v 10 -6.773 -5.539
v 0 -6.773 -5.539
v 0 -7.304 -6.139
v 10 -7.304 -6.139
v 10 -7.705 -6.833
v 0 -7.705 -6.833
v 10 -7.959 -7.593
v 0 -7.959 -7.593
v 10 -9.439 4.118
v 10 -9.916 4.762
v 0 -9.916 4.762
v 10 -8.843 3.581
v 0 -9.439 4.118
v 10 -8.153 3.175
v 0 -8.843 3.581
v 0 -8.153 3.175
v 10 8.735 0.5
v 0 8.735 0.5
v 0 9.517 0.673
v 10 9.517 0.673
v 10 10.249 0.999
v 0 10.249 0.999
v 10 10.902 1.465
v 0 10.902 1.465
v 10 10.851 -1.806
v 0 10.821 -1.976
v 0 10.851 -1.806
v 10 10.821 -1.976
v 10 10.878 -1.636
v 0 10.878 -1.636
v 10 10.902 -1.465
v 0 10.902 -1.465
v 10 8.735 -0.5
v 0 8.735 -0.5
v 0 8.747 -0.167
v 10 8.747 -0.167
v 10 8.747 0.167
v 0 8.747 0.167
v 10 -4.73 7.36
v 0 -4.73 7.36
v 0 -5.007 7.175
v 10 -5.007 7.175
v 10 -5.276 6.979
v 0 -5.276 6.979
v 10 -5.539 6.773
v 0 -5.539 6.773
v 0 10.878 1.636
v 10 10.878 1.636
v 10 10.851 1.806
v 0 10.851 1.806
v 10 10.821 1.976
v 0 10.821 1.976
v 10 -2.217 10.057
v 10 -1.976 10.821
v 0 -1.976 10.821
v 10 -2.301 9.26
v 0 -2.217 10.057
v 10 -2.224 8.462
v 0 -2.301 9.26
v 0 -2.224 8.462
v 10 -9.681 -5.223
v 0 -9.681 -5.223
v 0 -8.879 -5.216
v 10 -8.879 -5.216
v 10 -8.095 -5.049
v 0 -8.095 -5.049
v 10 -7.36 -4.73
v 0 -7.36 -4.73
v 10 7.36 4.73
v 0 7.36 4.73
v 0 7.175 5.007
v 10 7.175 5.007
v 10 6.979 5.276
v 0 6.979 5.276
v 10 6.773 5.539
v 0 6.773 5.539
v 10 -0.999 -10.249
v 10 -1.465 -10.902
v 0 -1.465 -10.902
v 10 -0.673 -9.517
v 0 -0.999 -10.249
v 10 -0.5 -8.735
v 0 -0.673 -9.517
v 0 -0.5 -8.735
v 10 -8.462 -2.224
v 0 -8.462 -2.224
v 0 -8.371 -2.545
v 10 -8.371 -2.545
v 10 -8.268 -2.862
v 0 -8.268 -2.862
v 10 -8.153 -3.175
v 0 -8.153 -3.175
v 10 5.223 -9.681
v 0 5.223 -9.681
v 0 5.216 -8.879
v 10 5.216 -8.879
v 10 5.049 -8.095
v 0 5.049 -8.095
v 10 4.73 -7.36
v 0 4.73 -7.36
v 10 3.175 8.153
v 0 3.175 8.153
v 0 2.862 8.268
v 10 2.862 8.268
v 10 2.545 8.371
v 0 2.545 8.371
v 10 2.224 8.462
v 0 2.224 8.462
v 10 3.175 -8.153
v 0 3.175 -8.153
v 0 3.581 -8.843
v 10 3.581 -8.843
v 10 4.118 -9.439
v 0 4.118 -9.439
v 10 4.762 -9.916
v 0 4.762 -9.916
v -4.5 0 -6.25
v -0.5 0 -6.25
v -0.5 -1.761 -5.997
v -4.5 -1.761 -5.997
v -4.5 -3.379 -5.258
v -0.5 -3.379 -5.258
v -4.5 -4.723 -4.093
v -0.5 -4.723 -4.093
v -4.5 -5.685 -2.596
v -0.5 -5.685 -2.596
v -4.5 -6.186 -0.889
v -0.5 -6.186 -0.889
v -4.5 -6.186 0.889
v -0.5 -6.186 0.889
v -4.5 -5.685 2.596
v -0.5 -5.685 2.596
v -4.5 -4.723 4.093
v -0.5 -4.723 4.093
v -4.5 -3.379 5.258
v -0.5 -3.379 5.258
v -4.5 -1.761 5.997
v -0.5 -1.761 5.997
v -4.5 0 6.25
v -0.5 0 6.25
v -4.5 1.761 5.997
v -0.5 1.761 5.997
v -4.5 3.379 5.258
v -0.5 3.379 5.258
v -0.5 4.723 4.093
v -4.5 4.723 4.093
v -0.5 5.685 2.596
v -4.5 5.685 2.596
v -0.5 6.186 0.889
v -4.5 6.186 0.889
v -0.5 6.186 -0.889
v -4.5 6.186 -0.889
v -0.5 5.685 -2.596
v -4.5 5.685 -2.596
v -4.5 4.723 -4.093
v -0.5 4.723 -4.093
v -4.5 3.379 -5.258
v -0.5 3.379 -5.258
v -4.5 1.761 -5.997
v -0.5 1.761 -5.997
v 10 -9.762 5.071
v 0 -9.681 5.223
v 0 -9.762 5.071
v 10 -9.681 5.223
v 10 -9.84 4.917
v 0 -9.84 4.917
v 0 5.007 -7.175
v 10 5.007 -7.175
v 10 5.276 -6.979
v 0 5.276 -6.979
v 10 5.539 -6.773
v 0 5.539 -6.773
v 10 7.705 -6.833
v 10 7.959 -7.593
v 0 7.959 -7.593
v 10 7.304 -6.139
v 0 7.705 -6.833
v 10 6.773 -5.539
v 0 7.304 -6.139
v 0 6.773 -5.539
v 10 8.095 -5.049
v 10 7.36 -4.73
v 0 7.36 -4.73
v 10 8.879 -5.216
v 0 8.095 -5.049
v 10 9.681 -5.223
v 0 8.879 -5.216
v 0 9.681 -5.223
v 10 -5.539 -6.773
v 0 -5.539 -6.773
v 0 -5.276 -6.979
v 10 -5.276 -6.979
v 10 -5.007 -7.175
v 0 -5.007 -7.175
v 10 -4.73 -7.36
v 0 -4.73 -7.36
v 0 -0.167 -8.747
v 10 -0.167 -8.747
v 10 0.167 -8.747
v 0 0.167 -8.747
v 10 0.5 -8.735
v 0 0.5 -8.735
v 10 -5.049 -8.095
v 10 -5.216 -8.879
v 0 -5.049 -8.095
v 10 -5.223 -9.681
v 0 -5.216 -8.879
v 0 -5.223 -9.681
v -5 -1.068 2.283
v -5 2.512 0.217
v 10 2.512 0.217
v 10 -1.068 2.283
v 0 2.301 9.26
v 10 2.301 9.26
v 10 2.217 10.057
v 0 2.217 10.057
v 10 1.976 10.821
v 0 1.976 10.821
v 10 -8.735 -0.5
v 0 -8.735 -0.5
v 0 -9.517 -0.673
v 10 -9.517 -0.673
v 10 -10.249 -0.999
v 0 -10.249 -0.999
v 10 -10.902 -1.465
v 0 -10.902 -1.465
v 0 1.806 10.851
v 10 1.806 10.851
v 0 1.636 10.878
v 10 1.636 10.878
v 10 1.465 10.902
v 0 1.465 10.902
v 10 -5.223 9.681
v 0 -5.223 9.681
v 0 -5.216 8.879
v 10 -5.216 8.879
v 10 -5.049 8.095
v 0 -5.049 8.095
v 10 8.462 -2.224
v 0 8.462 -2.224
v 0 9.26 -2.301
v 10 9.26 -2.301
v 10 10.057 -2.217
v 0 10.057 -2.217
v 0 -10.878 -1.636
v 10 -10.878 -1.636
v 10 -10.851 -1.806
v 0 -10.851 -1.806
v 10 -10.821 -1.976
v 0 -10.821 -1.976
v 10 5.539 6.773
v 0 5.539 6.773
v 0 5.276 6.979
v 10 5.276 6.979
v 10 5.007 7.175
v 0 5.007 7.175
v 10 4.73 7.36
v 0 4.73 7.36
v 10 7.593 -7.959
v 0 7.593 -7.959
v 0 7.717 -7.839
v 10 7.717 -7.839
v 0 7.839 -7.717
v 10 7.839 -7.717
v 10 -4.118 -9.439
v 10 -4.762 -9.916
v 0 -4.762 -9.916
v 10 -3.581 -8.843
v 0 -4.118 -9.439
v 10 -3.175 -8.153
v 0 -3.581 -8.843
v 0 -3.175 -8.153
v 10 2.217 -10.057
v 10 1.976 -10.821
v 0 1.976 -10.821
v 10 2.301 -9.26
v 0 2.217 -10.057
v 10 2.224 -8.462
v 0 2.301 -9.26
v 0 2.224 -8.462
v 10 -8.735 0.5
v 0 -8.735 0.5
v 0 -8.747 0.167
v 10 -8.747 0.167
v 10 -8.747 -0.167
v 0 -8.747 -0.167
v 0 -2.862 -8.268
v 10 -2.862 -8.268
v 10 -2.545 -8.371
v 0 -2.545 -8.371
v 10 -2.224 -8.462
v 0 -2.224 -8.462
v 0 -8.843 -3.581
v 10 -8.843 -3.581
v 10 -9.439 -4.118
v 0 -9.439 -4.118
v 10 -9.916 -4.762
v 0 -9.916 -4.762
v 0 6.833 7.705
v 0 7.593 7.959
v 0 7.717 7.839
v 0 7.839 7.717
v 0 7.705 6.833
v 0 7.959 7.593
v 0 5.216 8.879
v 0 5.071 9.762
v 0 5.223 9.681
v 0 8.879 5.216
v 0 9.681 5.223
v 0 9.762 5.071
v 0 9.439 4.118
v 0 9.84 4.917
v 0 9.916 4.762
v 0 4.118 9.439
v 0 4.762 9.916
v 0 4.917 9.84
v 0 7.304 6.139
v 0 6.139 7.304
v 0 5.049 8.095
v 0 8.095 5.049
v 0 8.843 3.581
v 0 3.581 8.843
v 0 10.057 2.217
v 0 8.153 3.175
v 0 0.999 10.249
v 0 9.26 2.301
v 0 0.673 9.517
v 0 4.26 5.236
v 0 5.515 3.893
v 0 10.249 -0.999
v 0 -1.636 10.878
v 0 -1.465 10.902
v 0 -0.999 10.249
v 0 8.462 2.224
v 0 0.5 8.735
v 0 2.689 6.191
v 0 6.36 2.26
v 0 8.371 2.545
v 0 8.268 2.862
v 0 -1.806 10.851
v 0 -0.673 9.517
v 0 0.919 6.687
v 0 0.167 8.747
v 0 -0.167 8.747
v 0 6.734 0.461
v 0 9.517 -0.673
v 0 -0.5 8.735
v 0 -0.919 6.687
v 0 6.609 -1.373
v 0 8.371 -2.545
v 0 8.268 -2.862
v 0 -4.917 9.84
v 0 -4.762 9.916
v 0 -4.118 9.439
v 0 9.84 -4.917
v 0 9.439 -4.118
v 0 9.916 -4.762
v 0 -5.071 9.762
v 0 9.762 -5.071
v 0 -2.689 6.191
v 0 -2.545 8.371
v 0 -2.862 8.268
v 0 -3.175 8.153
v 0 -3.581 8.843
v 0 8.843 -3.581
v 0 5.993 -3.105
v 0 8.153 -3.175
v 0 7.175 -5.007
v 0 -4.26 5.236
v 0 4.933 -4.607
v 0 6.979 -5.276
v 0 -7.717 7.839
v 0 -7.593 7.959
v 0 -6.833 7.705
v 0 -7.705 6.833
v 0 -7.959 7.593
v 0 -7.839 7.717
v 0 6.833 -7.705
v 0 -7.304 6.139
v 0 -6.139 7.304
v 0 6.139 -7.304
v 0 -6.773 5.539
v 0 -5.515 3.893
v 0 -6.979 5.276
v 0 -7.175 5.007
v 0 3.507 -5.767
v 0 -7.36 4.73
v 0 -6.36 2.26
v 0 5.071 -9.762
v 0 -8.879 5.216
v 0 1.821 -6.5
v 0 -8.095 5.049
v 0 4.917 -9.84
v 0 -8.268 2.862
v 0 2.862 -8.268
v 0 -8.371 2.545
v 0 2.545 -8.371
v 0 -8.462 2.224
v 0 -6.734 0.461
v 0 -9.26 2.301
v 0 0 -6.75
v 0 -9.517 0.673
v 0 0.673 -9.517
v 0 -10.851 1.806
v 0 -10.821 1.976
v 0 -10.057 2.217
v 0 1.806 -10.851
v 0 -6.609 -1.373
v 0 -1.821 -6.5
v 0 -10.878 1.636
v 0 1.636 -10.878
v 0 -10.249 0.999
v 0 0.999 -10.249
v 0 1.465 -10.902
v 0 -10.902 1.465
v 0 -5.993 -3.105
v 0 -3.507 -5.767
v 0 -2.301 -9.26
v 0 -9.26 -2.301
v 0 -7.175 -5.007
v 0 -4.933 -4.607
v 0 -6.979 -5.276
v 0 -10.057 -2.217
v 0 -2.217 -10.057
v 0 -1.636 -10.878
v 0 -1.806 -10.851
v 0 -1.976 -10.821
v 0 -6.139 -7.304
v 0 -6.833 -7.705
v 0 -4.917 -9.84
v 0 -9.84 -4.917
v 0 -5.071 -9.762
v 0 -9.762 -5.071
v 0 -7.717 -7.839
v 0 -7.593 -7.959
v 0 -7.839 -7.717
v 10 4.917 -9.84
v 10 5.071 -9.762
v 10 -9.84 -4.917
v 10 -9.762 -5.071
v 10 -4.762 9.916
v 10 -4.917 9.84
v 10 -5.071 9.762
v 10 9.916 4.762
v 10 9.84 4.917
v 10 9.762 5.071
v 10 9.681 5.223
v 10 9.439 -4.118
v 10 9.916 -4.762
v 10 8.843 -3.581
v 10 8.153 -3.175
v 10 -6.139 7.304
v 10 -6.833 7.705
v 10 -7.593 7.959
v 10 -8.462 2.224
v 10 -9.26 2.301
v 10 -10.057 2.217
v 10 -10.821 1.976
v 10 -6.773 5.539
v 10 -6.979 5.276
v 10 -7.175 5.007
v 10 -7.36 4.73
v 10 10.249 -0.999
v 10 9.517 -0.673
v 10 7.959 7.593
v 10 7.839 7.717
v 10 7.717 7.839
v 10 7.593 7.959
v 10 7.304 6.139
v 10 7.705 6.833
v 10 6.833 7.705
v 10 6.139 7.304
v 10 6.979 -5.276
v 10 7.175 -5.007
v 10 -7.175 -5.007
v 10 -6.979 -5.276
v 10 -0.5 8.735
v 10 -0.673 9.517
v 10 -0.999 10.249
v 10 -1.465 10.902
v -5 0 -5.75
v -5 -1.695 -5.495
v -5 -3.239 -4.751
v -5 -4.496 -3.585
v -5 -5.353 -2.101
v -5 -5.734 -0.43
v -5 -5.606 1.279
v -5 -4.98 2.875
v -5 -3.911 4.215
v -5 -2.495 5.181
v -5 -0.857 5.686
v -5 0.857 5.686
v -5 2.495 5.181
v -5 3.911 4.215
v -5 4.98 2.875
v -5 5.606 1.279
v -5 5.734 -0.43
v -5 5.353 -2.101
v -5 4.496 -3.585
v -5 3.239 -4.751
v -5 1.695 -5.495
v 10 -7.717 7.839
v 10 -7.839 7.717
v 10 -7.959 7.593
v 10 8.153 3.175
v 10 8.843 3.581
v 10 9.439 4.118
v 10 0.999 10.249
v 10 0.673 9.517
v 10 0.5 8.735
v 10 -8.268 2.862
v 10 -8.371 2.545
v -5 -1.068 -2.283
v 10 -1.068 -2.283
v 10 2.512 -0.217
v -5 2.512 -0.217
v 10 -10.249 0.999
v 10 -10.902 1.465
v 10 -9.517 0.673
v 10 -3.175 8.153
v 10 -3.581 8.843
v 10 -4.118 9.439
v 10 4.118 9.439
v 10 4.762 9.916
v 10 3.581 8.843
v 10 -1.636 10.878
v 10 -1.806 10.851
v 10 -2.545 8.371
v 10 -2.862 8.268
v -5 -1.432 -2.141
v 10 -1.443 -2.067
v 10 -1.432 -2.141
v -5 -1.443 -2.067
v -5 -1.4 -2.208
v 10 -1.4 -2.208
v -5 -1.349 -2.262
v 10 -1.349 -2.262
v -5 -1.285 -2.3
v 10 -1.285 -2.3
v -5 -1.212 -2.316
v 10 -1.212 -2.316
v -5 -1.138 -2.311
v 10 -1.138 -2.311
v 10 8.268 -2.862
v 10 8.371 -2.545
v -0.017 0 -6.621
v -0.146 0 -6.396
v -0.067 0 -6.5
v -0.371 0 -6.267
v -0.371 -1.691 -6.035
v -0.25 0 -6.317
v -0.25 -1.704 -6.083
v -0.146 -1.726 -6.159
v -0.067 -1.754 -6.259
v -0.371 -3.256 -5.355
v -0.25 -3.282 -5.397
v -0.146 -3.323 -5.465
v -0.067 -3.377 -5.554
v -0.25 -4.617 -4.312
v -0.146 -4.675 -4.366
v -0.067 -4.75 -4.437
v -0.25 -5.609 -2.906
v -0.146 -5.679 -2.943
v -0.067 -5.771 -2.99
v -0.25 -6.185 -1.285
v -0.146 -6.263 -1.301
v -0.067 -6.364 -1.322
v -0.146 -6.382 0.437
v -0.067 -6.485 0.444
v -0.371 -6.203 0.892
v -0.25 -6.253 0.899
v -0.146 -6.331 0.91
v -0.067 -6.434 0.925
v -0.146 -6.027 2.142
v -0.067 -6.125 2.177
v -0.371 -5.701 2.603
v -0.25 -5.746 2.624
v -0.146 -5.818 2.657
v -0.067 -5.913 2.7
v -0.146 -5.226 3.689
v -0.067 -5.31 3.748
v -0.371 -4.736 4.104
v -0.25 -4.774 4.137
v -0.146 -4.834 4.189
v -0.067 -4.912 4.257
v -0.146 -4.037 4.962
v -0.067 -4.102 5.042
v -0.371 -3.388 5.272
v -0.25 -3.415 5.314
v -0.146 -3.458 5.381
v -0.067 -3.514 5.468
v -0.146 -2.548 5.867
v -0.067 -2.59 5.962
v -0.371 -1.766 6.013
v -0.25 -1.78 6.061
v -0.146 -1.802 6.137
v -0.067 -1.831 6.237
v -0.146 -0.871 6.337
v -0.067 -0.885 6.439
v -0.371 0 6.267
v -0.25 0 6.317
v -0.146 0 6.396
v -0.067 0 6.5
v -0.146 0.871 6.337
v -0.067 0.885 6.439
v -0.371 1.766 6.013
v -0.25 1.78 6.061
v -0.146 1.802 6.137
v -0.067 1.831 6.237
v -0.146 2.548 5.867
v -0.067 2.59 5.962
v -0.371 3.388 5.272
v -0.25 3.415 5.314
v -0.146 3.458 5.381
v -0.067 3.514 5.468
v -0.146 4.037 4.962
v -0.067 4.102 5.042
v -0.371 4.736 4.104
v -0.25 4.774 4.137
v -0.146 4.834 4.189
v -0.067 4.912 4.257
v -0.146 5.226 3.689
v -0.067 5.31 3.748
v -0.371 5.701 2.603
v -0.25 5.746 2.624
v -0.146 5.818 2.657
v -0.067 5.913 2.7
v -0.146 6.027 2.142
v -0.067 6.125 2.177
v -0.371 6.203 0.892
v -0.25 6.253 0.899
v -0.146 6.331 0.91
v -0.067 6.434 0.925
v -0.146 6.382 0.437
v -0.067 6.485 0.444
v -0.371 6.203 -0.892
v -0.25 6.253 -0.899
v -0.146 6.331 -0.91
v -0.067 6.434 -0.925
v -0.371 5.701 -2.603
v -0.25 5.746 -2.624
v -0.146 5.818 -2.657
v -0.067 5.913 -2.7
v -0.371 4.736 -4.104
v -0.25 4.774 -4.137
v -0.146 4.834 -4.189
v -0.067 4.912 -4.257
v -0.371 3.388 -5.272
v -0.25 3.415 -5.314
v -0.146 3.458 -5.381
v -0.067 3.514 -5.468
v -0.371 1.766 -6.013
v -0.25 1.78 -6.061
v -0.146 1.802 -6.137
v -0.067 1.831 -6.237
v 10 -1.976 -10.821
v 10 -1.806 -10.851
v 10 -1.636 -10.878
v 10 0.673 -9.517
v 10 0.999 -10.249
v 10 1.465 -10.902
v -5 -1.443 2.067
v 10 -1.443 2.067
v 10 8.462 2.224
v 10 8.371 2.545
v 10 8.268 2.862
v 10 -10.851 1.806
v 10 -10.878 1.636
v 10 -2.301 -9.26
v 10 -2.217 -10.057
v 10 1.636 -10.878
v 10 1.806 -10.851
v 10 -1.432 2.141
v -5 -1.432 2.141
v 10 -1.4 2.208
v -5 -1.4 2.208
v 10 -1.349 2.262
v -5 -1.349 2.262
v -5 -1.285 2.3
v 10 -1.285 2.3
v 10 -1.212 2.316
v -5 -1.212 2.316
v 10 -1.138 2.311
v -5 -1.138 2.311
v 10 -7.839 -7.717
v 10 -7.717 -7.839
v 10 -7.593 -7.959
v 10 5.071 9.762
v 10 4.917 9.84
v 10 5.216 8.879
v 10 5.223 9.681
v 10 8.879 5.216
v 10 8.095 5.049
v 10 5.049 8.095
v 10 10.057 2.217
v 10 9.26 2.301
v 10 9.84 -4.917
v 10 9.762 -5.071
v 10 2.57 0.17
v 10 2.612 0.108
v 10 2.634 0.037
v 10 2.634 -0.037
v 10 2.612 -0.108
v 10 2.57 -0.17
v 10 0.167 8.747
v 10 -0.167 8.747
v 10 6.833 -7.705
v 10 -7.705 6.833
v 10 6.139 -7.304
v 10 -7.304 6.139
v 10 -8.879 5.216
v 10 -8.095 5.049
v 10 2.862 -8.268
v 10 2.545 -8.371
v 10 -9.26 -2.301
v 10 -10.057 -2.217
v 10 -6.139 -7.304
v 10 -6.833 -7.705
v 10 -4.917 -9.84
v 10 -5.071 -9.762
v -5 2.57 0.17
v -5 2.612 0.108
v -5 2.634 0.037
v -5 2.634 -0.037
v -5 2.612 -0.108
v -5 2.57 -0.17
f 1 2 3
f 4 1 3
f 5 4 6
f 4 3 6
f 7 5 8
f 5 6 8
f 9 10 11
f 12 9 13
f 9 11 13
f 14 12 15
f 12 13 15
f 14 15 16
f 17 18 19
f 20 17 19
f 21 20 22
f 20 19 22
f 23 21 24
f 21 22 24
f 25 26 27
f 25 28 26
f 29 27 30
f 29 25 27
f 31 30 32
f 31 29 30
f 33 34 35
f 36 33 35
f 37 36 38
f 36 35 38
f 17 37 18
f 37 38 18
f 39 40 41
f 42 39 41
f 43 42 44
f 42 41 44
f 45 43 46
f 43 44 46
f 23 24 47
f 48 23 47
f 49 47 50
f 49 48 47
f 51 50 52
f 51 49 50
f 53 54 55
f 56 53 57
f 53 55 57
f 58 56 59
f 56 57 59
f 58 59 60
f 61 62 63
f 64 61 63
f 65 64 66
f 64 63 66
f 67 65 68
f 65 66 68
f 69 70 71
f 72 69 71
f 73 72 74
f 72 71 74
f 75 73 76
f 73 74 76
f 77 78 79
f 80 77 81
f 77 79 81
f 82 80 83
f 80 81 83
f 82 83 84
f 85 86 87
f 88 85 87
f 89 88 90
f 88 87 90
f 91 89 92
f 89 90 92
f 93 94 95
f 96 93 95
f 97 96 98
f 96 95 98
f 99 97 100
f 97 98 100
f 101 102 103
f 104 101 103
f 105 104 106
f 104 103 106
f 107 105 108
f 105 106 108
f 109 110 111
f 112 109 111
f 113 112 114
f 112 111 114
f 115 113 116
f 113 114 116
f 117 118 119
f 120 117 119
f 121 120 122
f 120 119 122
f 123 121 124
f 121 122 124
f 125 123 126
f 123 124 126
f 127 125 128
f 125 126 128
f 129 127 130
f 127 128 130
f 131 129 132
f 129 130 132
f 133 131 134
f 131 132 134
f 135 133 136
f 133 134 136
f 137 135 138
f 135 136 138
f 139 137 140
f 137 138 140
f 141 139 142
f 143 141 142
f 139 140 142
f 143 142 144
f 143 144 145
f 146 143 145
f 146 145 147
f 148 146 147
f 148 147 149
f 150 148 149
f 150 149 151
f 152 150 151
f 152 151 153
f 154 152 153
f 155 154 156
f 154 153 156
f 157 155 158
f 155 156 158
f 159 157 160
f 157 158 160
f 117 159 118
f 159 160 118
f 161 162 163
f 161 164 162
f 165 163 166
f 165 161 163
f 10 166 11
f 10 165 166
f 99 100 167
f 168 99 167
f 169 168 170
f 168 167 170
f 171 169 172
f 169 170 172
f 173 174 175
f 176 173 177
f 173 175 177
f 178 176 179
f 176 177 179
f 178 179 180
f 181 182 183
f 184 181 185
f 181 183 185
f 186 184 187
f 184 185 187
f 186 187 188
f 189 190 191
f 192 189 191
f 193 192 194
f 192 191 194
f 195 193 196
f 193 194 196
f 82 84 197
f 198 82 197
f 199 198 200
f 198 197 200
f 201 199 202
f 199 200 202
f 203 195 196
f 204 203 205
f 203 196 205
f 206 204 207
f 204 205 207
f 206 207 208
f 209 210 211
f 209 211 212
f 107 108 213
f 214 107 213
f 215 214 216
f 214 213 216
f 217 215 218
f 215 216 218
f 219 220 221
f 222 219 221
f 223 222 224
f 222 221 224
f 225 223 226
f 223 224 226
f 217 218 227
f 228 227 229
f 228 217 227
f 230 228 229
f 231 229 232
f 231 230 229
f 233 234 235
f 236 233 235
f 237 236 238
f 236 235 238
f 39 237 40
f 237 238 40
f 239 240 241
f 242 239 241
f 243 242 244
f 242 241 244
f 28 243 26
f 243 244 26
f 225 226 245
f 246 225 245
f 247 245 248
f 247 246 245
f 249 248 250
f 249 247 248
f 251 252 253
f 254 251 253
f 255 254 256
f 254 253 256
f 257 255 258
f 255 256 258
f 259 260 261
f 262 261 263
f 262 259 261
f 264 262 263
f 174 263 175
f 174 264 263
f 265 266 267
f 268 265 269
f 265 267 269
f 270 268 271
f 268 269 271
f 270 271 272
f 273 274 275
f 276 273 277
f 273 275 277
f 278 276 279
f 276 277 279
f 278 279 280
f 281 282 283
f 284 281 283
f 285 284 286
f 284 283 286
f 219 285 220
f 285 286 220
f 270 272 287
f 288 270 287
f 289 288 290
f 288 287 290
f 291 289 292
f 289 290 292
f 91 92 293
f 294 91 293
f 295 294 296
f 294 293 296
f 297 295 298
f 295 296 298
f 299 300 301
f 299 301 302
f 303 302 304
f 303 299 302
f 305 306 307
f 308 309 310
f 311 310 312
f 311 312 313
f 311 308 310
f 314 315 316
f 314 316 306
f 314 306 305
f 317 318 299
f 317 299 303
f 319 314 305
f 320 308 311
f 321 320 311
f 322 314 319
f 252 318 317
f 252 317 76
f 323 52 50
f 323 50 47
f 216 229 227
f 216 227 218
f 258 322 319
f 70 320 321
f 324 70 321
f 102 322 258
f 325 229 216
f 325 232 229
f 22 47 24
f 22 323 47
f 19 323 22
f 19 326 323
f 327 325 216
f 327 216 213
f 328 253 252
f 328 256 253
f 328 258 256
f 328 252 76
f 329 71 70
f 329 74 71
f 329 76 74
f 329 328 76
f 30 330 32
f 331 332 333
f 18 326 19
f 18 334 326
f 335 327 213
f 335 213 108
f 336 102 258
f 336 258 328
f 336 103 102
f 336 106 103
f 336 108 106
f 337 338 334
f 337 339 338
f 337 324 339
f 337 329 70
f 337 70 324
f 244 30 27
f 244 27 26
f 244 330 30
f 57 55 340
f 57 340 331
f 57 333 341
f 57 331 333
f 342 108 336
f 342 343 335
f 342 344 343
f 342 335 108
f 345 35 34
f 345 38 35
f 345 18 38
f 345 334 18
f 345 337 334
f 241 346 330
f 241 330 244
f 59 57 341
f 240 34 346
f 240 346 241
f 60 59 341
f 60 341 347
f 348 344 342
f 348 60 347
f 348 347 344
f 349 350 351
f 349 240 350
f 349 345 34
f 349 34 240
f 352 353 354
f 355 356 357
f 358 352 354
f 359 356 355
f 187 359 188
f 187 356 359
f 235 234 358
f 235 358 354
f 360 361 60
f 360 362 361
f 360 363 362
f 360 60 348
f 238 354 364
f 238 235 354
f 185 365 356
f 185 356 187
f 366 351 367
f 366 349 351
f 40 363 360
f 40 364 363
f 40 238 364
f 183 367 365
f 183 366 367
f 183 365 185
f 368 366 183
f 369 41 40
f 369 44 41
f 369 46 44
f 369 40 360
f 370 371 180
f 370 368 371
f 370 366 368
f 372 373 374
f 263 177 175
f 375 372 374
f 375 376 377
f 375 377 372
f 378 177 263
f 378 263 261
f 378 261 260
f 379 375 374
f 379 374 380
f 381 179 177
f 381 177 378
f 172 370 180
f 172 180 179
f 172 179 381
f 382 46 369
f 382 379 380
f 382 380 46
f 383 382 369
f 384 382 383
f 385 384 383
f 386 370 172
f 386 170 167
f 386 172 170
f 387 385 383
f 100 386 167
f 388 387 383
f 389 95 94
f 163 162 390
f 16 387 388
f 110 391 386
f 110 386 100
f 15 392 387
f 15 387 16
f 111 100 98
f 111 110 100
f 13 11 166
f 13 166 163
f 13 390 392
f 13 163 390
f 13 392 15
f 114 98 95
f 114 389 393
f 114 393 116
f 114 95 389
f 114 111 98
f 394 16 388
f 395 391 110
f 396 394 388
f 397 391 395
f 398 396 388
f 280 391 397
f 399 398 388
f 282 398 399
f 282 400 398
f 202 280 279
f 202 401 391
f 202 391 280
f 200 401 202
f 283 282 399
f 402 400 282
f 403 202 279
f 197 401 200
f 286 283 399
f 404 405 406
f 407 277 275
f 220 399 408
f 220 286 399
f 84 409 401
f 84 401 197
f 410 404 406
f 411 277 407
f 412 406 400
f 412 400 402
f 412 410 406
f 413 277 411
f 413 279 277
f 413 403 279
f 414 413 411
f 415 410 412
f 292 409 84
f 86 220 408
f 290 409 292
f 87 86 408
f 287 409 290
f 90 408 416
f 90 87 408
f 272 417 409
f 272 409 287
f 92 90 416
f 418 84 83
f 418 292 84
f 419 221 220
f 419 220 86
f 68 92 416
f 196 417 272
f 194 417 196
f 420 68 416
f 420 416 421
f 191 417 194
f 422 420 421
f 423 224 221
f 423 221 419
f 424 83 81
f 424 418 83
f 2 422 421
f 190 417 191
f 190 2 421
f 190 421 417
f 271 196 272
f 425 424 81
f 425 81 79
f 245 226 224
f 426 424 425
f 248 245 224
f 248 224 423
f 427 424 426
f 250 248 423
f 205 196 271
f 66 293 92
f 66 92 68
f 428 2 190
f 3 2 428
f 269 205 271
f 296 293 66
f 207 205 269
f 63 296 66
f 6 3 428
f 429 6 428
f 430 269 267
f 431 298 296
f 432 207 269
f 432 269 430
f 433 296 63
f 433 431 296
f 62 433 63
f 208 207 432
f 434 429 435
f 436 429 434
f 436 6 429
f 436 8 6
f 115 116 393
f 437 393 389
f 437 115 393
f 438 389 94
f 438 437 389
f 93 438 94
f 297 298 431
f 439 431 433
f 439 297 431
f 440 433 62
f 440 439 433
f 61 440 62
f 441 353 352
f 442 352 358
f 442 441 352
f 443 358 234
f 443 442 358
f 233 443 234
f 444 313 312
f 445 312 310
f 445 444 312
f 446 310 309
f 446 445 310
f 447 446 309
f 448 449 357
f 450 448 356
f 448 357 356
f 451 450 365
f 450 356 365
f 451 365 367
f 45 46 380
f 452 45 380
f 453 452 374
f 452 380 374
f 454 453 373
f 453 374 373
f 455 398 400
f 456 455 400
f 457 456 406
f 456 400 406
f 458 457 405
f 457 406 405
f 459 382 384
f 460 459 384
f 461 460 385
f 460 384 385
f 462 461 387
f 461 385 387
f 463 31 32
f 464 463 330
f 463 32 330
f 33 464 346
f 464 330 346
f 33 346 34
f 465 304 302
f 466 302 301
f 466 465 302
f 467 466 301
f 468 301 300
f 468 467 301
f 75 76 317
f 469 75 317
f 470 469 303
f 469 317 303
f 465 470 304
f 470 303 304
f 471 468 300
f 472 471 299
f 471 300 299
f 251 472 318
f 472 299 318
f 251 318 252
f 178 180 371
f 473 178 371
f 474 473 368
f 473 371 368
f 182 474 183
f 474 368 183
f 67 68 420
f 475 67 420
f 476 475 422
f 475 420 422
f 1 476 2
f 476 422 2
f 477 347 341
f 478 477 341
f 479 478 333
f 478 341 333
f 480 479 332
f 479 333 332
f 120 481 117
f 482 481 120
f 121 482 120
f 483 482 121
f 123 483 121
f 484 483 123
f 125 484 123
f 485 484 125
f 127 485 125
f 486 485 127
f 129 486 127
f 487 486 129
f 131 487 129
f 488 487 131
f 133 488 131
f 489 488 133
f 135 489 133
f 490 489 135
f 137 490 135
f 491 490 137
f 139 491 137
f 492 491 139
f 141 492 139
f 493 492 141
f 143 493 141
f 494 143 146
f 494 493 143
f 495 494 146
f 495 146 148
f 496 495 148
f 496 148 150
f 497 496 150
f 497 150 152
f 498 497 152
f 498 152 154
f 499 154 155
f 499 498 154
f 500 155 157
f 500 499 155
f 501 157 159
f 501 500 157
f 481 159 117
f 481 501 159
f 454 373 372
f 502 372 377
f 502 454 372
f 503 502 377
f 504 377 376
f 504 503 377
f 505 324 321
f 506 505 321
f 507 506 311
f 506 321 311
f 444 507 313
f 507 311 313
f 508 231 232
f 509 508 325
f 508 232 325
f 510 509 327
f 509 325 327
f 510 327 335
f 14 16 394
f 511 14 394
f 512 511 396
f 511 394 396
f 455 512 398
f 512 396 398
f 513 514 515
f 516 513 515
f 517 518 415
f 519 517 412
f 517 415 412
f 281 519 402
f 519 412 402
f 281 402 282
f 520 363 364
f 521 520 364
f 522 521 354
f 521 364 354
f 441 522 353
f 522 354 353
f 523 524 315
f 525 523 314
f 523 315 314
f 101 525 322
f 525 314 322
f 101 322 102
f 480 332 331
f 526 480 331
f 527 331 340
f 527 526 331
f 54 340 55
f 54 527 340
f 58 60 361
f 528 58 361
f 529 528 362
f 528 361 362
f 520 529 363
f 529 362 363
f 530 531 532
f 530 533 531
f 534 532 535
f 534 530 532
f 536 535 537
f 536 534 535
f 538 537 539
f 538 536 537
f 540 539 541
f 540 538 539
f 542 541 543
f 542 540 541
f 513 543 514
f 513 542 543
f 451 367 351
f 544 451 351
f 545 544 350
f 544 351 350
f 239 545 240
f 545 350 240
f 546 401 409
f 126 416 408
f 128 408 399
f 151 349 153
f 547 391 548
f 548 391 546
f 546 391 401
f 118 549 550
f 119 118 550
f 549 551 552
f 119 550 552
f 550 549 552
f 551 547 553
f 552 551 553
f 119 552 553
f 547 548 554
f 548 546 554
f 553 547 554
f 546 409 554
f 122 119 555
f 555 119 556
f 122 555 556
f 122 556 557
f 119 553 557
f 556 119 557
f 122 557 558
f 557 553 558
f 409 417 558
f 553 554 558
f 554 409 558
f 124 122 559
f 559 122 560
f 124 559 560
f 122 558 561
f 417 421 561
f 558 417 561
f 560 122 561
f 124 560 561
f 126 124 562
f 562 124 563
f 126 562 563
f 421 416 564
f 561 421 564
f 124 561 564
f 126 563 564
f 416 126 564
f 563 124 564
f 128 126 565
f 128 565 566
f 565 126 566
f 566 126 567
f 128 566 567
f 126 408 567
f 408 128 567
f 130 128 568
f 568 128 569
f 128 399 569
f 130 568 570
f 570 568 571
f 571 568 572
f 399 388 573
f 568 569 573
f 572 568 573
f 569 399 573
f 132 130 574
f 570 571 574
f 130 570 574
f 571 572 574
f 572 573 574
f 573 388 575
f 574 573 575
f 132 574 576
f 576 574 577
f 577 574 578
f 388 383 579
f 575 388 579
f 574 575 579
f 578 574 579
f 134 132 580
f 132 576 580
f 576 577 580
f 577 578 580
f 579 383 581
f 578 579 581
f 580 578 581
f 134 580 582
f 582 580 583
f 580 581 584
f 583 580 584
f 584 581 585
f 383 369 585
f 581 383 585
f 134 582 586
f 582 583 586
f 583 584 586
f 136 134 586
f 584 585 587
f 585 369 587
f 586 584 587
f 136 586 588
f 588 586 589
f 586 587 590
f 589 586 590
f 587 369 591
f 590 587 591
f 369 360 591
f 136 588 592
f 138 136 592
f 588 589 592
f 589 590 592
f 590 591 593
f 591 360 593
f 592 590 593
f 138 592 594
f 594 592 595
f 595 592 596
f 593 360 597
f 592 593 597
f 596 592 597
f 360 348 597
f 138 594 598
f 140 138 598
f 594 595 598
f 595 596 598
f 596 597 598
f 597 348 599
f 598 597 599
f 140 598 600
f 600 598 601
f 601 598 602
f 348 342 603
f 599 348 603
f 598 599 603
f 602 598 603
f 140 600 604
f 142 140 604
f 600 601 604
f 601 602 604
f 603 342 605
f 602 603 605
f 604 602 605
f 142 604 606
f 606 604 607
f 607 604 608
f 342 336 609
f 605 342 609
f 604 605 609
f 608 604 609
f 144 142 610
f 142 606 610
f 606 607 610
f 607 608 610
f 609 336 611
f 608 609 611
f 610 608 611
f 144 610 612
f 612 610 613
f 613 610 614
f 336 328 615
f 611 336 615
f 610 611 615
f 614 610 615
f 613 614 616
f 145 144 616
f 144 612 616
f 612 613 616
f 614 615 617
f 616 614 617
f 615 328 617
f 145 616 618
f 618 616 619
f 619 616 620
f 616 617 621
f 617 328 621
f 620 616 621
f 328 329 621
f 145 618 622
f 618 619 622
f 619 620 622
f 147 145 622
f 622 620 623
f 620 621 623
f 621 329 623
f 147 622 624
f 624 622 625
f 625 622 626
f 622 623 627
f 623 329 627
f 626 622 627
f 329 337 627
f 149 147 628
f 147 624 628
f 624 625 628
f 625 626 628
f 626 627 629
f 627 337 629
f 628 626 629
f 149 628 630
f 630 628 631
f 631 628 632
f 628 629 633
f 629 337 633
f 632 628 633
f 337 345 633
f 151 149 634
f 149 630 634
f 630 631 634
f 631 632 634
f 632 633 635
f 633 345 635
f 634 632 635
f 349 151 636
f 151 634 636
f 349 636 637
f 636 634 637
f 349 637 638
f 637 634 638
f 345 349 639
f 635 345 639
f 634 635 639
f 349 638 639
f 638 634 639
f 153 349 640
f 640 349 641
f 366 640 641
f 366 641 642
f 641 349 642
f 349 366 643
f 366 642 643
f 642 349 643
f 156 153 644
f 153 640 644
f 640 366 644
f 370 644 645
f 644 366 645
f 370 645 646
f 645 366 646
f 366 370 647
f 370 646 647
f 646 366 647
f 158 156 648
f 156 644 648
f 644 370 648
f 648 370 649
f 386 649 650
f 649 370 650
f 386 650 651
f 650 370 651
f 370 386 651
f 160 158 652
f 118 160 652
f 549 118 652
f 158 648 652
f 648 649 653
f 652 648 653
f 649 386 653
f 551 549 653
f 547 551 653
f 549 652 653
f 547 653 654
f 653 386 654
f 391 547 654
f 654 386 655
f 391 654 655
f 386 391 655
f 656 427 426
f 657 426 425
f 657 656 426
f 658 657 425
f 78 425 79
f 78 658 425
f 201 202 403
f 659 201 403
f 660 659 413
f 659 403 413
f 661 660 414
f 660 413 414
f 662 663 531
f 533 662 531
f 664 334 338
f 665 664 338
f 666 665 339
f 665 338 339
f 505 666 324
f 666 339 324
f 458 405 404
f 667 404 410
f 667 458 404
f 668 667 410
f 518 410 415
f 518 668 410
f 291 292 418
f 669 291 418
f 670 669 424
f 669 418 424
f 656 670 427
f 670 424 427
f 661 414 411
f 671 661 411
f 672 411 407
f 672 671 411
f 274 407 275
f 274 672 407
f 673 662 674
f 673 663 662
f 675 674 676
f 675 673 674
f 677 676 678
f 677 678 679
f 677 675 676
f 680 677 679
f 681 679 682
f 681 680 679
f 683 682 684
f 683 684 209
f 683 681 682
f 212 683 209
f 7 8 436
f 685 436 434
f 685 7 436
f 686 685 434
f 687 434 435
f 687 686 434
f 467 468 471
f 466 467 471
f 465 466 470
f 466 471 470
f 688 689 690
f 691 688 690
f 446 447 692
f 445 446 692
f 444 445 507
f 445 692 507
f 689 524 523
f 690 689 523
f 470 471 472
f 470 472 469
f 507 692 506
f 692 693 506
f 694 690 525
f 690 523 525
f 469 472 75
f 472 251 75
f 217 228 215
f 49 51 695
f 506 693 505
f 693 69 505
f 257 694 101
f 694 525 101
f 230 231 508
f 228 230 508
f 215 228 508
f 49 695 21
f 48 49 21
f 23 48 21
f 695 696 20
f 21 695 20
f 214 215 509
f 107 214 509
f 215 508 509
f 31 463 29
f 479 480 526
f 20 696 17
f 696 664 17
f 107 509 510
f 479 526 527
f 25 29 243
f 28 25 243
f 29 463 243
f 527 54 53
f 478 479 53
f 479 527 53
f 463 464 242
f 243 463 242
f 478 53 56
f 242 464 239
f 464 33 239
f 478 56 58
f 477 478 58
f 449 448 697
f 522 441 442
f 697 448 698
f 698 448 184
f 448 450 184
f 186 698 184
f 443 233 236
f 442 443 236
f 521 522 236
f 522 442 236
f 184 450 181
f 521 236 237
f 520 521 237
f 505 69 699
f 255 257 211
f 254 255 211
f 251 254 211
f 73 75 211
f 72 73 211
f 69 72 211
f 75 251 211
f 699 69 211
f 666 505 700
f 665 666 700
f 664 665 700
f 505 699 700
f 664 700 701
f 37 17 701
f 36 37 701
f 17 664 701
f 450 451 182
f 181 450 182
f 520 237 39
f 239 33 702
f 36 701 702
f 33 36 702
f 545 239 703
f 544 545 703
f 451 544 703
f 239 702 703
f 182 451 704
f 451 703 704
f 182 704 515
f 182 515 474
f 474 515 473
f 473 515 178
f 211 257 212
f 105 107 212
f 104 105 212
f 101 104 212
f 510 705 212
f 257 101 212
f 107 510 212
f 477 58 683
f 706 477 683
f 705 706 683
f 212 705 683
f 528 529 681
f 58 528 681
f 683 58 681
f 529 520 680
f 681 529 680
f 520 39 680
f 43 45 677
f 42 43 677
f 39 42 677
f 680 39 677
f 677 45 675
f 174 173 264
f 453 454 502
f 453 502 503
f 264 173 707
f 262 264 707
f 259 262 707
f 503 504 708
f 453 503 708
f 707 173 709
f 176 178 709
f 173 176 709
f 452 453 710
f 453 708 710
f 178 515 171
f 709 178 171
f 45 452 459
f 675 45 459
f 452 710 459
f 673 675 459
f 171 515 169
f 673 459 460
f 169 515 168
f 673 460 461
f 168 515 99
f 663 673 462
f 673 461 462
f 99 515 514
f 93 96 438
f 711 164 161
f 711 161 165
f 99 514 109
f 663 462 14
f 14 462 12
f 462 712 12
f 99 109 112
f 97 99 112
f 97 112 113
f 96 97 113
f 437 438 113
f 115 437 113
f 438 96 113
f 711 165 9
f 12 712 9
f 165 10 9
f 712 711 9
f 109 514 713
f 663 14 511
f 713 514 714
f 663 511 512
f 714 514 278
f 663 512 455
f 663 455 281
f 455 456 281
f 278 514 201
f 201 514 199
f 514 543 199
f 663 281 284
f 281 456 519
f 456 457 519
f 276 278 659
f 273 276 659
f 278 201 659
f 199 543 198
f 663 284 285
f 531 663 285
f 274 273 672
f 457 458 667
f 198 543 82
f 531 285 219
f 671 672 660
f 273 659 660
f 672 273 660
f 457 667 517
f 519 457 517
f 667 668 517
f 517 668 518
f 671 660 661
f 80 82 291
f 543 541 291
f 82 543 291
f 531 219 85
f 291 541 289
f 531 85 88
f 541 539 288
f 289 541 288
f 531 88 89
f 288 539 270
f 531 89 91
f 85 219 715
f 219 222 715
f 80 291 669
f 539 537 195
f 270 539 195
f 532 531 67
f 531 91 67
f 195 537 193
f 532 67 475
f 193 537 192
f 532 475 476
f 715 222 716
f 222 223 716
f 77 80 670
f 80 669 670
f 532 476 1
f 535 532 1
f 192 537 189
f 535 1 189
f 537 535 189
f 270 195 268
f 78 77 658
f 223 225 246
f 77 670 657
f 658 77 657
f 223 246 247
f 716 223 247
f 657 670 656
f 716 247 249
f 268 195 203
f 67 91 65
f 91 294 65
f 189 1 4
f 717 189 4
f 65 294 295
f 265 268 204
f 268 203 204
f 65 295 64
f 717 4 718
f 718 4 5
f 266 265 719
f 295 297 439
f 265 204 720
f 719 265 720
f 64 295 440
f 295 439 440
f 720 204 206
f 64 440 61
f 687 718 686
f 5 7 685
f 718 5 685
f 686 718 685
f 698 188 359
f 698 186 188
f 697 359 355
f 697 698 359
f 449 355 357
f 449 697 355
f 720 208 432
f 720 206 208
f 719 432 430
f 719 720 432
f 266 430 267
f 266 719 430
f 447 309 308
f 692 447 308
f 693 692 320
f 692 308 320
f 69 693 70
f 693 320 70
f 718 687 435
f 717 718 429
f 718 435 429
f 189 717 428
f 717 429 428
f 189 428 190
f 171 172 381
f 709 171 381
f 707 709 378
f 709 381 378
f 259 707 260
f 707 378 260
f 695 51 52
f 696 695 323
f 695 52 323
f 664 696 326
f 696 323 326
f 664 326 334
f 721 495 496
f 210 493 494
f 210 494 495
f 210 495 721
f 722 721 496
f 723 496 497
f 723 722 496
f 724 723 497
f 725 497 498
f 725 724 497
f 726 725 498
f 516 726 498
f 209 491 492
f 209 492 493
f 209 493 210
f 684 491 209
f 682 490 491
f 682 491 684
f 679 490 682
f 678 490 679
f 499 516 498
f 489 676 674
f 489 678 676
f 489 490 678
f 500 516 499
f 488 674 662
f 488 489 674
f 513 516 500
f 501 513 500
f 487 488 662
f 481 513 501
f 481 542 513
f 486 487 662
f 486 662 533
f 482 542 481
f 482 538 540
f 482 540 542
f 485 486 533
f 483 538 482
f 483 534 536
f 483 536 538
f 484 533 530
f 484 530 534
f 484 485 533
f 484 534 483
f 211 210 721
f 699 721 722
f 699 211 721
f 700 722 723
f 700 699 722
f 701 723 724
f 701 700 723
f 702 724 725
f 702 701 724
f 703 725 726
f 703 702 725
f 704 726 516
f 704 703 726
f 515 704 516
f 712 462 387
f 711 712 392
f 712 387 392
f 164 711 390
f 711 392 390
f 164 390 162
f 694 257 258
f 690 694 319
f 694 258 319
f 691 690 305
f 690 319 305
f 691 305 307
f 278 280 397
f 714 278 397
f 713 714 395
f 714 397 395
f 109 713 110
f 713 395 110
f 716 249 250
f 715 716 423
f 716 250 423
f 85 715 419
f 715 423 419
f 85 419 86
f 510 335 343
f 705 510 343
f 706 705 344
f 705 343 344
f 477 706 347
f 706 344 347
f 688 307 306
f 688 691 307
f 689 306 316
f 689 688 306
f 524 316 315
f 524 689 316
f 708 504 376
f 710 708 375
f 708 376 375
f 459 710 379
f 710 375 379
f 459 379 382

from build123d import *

# Parameters (mm, degrees)
BASPROSKE_W             = 10
BASPROSKE_H             = 11
TOOTHCUT_DEPTH          = 19.493242009
TEETHCUTS_COUNT         = 20
TEETHCUTS_ANGLE         = 342
BORSKE_R                = 0.4
BORE_DEPTH              = 50.0000508
SKETCH1_R               = 6.25
BOSS_EXTRUDE1_DEPTH     = 5
CUT_EXTRUDE1_DEPTH      = 19.376827944
CUT_EXTRUDE1_DEPTH_BACK = 19.376827944
FILLET1_R               = 0.5
CHAMFER1_SIZE           = 0.5
FILLET2_R               = 0.25


with BuildPart() as part:
    # BasProSke → Base-Revolve (revolve)
    with BuildSketch(Plane(origin=(0, 0, 0), x_dir=(1, 0, 0), z_dir=(0, 1, 0)), mode=Mode.PRIVATE) as base_revolve_sk:
        with Locations((5, 5.5)):
            Rectangle(BASPROSKE_W, BASPROSKE_H)
    revolve(base_revolve_sk.sketch.rotate(Axis((-10, 0, 0), (1, 0, 0)), 180), axis=Axis((-10, 0, 0), (1, 0, 0)))

    # TooCutSke → ToothCut (cut, through all)
    with BuildSketch(Plane(origin=(0, 0, 0), x_dir=(0, 0, -1), z_dir=(1, 0, 0))):
        with BuildLine():
            ThreePointArc((0.499924007, 8.734705318), (0, 8.749), (-0.499924007, 8.734705318))
            ThreePointArc((-0.499924007, 8.734705318), (-0.824302243, 9.905497836), (-1.485192705, 10.924909509))
            ThreePointArc((-1.485192705, 10.924909509), (0, 11.0254), (1.485192705, 10.924909509))
            ThreePointArc((1.485192705, 10.924909509), (0.824302243, 9.905497836), (0.499924007, 8.734705318))
        make_face()
    toothcut = extrude(amount=TOOTHCUT_DEPTH, mode=Mode.SUBTRACT)

    # TeethCuts: ToothCut ×20 about axis
    teethcuts_axis = Axis((-10, 0, 0), (1, 0, 0))
    for i in range(1, TEETHCUTS_COUNT):
        add(toothcut.rotate(teethcuts_axis, i * TEETHCUTS_ANGLE / (TEETHCUTS_COUNT - 1)), mode=Mode.SUBTRACT)

    # BorSke → Bore (cut, symmetric)
    with BuildSketch(Plane(origin=(0, 0, 0), x_dir=(0, 0, -1), z_dir=(1, 0, 0))):
        with Locations(Location((0, 0, 0), (0, 0, 180))):
            Circle(BORSKE_R)
    extrude(amount=BORE_DEPTH, both=True, mode=Mode.SUBTRACT)

    # Sketch1 → Boss-Extrude1 (add)
    with BuildSketch(Plane.ZY):
        with Locations(Location((0, 0, 0), (0, 0, 180))):
            Circle(SKETCH1_R)
    extrude(amount=BOSS_EXTRUDE1_DEPTH)

    # Sketch2 → Cut-Extrude1 (cut, two sides)
    with BuildSketch(Plane(origin=(0, 0, 0), x_dir=(0, 0, -1), z_dir=(1, 0, 0))) as cut_extrude1_sk:
        Polygon((-2.5, -1.443375673), (2.5, -1.443375673), (0, 2.886751346), align=None)
    extrude(amount=CUT_EXTRUDE1_DEPTH, mode=Mode.SUBTRACT)
    extrude(cut_extrude1_sk.sketch, amount=-CUT_EXTRUDE1_DEPTH_BACK, mode=Mode.SUBTRACT)

    # Fillet1
    fillet1_edges = [part.edges().sort_by_distance(p)[0] for p in [
        (0, 0, 6.25),
    ]]
    fillet(fillet1_edges, radius=FILLET1_R)

    # Chamfer1
    chamfer1_edges = [part.edges().sort_by_distance(p)[0] for p in [
        (-5, 0, 6.25),
    ]]
    chamfer(chamfer1_edges, length=CHAMFER1_SIZE)

    # Fillet2
    fillet2_edges = [part.edges().sort_by_distance(p)[0] for p in [
        (2.5, -1.443375673, 2.5),
        (2.5, 2.886751346, 0),
        (2.5, -1.443375673, -2.5),
    ]]
    fillet(fillet2_edges, radius=FILLET2_R)


solid = part.part
